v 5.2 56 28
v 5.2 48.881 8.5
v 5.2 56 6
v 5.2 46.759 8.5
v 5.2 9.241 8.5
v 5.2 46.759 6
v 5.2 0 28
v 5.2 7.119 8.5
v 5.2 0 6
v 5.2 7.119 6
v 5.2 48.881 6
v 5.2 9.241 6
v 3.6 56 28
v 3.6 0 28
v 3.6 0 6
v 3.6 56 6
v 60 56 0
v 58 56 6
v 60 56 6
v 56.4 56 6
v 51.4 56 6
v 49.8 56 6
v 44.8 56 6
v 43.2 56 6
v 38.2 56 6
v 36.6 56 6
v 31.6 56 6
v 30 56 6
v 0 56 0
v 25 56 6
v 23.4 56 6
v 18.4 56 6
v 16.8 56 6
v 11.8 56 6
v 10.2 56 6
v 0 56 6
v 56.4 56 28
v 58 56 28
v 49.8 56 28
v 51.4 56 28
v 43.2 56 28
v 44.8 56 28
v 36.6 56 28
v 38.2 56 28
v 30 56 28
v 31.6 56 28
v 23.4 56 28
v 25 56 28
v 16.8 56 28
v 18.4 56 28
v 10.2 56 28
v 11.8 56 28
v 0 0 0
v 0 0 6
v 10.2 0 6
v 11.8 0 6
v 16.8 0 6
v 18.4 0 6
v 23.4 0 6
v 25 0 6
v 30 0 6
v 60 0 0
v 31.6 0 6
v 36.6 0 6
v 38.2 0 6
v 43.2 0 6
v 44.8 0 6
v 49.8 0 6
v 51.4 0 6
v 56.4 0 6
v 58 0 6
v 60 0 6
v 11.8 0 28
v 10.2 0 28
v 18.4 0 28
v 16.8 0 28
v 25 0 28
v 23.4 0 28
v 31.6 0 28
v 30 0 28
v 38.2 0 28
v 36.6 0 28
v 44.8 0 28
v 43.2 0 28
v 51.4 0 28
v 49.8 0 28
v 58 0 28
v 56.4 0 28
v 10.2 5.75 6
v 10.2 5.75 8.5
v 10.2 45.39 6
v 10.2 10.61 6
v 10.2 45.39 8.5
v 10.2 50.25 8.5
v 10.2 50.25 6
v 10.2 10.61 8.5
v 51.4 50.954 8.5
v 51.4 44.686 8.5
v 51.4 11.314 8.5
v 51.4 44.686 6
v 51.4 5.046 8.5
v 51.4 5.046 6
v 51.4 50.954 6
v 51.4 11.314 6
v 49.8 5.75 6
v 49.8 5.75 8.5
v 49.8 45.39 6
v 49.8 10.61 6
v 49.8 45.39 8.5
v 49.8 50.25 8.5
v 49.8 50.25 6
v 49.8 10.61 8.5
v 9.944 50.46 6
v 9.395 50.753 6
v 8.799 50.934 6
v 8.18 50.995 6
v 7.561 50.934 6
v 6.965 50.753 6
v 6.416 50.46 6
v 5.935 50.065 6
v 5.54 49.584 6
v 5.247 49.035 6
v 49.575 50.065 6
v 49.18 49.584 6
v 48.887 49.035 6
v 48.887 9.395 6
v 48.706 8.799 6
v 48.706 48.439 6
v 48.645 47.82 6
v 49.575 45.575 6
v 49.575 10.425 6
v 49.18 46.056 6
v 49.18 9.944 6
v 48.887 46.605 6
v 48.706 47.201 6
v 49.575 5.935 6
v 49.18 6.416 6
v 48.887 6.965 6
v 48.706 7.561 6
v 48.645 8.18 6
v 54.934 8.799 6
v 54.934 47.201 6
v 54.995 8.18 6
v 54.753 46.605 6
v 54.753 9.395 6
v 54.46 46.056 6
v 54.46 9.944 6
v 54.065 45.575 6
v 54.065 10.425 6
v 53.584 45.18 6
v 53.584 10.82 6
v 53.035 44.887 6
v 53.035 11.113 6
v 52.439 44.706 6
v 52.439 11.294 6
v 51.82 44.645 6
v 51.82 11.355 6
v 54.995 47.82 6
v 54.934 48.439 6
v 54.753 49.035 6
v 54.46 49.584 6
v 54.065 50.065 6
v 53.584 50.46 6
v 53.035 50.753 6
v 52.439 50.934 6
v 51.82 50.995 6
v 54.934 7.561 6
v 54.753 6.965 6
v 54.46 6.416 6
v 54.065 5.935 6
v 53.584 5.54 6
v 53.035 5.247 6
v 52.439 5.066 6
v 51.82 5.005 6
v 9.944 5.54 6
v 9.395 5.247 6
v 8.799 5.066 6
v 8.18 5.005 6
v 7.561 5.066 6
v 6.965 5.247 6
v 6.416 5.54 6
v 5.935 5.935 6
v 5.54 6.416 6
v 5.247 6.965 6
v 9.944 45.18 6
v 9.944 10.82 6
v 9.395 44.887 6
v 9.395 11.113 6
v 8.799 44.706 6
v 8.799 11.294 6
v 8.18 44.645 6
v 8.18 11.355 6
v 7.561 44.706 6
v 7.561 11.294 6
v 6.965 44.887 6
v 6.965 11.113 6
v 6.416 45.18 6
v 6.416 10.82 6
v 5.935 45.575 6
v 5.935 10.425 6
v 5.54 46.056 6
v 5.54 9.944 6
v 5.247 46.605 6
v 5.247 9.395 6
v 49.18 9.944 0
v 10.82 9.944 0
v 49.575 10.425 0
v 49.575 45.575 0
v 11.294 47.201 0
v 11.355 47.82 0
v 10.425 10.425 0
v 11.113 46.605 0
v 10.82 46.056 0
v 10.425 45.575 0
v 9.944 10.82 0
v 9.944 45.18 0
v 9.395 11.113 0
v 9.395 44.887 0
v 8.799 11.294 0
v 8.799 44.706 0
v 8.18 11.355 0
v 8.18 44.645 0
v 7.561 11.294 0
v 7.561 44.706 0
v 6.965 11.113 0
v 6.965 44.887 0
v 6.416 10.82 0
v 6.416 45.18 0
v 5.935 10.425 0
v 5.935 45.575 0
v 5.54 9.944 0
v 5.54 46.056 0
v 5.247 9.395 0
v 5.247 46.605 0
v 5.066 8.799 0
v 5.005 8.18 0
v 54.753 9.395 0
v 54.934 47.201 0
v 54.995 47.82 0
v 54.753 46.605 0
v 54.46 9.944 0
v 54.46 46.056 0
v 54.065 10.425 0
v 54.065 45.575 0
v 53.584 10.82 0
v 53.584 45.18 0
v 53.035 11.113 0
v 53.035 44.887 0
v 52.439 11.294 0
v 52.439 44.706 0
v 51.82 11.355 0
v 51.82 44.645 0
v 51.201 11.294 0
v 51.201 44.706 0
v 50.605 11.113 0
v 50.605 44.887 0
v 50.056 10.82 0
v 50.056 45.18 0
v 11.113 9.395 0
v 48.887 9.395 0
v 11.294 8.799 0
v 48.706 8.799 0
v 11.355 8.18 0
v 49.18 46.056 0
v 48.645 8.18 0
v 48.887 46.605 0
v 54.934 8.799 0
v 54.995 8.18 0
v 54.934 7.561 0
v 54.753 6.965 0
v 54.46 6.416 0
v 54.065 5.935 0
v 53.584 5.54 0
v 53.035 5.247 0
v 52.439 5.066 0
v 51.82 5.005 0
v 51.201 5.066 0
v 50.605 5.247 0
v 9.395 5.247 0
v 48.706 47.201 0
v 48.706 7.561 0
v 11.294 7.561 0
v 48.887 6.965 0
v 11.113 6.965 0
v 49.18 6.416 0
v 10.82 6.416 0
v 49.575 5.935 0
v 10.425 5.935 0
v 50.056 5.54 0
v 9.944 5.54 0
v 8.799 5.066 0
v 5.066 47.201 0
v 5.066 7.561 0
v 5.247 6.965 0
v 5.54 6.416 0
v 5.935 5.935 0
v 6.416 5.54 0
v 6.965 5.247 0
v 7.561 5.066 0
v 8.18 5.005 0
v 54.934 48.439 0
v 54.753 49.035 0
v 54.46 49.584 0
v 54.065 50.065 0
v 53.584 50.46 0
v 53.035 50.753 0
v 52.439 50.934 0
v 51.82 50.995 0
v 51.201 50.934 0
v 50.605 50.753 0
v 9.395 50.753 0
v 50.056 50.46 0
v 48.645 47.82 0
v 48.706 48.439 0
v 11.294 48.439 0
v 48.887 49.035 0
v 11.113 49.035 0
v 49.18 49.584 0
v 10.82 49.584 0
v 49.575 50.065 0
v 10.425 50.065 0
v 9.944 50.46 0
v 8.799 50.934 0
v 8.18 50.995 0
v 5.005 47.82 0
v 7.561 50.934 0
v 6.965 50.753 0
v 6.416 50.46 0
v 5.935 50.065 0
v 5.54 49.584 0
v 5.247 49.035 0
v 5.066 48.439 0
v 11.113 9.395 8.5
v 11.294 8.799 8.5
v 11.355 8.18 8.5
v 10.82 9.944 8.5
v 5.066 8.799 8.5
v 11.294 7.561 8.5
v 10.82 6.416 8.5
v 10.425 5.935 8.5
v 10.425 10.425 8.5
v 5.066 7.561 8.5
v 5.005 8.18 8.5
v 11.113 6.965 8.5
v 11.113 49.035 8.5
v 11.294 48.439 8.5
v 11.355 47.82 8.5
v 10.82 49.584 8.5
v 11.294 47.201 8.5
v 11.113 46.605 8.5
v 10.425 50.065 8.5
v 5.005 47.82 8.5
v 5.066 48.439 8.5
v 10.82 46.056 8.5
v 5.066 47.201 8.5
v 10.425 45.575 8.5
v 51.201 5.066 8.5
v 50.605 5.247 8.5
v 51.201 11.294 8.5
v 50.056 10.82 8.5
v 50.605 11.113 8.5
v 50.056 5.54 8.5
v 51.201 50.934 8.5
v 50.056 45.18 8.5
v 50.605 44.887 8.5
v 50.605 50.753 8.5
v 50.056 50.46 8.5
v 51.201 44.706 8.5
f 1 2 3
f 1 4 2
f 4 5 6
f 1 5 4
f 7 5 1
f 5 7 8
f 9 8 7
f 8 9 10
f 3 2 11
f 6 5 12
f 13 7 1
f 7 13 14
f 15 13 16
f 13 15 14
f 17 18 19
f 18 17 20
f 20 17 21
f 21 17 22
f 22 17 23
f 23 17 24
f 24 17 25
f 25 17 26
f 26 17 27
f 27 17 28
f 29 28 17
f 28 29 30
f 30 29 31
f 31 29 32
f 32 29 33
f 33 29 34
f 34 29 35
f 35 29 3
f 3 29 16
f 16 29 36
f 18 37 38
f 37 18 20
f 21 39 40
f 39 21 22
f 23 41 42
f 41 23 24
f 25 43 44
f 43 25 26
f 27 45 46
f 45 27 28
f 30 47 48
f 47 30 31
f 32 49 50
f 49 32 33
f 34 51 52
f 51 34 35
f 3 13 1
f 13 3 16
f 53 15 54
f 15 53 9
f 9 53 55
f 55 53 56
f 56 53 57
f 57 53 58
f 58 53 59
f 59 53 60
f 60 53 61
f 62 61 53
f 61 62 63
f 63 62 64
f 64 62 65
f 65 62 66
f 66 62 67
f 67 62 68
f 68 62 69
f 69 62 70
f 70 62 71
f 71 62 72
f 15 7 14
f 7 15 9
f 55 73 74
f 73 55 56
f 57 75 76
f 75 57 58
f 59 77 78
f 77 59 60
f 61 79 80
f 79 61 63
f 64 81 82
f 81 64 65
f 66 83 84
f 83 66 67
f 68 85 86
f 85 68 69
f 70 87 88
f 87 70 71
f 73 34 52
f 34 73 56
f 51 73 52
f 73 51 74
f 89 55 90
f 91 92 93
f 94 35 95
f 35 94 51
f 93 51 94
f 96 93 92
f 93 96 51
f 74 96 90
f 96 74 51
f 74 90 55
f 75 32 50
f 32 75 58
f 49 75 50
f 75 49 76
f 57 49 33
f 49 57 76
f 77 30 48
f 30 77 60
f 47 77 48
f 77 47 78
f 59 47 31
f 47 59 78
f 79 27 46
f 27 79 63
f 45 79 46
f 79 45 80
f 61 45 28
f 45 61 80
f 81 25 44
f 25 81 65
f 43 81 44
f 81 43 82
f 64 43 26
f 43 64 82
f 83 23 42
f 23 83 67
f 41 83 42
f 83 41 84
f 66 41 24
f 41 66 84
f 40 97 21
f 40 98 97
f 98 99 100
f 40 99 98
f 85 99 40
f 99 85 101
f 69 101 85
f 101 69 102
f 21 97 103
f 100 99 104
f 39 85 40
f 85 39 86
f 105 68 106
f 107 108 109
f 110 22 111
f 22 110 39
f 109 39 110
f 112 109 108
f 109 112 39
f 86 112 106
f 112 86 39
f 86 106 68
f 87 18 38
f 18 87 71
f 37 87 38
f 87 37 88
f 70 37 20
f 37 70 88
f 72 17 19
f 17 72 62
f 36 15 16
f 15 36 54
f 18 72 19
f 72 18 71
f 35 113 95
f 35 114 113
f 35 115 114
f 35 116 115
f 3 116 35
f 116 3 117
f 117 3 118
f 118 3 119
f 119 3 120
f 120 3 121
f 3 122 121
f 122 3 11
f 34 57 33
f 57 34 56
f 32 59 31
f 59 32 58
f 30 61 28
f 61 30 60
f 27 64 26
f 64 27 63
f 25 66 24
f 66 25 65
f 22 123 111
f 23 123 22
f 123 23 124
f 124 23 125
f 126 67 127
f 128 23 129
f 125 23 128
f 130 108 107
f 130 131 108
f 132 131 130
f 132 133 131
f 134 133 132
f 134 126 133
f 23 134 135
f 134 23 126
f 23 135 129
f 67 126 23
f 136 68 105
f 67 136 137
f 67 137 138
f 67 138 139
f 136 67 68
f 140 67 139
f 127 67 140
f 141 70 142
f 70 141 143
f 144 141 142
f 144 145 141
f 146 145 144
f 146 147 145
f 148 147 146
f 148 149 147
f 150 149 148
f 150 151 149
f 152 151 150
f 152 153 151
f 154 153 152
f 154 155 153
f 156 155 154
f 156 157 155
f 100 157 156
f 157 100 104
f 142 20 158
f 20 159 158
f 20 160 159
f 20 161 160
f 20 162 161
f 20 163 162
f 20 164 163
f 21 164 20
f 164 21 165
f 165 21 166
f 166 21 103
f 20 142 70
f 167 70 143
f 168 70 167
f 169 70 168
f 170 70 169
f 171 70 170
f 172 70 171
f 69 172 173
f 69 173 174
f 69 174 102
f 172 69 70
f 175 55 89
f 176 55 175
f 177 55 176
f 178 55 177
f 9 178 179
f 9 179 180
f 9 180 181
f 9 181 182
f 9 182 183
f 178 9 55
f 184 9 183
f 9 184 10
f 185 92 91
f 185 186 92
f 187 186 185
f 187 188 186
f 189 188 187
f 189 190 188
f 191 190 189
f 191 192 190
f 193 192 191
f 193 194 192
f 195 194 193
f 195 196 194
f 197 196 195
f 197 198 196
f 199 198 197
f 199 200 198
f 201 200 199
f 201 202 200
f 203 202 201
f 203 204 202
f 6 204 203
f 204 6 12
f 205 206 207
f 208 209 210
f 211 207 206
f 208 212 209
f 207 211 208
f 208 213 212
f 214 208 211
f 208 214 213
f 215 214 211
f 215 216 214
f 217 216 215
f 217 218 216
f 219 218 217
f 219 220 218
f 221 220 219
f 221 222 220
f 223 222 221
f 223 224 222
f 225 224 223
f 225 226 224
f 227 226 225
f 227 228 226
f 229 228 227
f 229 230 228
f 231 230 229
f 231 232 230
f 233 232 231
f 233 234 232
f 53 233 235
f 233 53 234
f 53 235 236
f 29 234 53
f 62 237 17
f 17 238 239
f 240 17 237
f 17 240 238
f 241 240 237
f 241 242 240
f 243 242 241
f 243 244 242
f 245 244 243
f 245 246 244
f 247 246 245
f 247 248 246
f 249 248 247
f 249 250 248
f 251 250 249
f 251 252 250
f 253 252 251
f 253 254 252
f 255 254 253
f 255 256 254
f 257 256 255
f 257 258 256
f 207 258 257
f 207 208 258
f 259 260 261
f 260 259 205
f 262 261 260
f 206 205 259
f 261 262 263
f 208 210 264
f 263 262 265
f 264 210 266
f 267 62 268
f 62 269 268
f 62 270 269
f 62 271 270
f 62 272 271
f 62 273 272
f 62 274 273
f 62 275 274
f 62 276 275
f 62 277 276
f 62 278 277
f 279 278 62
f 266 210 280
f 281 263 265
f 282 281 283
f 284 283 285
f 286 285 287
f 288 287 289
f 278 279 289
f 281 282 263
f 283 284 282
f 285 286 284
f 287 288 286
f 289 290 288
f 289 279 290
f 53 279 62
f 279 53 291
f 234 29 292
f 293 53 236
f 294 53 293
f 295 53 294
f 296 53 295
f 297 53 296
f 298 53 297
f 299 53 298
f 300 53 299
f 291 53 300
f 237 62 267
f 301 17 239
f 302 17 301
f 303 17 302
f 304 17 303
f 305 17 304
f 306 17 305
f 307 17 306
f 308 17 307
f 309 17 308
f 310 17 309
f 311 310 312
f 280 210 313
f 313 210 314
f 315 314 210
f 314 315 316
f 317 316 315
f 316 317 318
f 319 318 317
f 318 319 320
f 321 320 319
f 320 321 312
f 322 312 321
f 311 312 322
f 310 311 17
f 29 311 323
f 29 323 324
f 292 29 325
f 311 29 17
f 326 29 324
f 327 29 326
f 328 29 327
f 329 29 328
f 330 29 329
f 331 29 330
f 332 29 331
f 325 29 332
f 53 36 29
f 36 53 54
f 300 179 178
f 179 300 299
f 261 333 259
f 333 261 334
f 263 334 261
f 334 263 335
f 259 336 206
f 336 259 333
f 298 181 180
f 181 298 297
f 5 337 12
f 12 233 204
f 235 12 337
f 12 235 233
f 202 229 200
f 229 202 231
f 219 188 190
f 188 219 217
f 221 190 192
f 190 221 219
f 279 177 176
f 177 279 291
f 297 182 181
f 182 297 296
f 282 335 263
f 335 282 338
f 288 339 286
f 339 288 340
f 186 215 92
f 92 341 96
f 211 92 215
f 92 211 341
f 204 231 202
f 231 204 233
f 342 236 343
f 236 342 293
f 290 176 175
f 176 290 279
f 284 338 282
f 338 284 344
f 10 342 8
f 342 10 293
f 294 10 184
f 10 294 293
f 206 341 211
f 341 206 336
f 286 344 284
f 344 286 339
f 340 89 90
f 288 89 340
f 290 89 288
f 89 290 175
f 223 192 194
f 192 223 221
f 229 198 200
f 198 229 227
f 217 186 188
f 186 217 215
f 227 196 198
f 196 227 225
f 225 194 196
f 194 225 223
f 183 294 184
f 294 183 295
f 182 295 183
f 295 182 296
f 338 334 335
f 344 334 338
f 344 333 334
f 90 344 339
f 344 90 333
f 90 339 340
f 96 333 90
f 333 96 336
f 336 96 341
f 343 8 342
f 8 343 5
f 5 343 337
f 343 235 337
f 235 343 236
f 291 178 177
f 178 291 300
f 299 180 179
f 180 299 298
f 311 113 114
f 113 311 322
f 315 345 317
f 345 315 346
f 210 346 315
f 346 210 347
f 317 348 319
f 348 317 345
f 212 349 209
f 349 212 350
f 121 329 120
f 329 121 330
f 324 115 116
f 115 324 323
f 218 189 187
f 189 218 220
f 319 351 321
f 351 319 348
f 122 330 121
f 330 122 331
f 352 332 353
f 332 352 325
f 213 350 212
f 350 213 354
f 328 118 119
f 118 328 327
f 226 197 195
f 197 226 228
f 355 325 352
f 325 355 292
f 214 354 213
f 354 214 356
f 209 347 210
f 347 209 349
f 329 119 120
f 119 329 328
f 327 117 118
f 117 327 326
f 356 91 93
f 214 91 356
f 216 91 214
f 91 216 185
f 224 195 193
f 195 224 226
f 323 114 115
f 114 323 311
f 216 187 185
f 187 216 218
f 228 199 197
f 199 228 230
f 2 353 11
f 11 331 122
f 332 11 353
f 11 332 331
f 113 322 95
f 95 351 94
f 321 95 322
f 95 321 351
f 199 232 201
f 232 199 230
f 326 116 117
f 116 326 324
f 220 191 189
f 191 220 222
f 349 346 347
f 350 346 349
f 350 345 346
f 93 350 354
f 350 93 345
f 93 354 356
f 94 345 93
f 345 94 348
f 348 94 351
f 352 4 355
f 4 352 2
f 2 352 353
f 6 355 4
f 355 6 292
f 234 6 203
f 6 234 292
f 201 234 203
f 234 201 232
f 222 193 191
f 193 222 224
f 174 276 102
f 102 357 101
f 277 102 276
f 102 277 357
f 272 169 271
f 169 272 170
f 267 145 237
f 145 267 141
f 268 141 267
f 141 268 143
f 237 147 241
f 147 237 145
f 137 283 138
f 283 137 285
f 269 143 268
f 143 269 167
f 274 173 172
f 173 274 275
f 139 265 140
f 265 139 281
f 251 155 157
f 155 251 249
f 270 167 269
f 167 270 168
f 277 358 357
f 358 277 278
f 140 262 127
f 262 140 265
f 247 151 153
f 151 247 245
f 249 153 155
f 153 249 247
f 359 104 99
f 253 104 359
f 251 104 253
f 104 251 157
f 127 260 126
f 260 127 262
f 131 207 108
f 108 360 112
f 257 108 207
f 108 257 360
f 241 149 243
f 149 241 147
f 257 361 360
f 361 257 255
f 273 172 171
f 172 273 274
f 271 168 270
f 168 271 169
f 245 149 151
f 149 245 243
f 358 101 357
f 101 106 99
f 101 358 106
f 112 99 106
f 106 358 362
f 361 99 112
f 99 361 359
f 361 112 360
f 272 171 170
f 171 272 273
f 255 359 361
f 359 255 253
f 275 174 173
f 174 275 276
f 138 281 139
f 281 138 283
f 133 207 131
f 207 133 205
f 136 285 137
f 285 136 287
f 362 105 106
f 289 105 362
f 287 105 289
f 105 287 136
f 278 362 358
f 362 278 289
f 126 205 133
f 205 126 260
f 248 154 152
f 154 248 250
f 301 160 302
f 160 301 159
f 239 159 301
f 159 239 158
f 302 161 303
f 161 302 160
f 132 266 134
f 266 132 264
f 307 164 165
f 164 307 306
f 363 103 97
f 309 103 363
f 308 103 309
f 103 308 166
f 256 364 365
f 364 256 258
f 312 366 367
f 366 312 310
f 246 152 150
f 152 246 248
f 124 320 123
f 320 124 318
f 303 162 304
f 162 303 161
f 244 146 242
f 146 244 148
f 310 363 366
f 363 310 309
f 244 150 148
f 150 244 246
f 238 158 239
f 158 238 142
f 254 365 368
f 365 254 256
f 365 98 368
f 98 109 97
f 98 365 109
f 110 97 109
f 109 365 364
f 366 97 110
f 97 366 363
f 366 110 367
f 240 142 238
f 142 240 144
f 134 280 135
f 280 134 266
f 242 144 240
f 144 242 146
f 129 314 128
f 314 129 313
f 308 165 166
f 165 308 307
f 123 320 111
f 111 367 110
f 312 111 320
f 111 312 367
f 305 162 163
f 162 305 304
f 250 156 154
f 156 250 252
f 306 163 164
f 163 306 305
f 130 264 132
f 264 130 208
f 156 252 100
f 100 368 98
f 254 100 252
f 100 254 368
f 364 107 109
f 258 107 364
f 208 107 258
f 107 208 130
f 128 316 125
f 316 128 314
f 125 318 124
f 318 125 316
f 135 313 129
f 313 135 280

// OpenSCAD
$fn = 32;

// ----------------------------------------------------------------------
// Finned heat sink: 60 x 56 mm base, 22 mm fins
// ----------------------------------------------------------------------

// --- parameters (mm) ---
base_w = 60;              // base width
base_d = 56;              // base depth
base_t = 6;               // base thickness
fin_h = 22;               // fin height above the base
holes_d = 6.35;           // fixing holes
hole_x = 21.82;           // hole offset in x
hole_y = 19.82;           // hole offset in y
fin_t = 1.6;              // fin thickness
fin_pitch = 6.6;          // fin pitch
fin_count = 9;            // number of fins
fin_x0 = 3.6;             // first fin offset

difference() {
  union() {
    cube([base_w, base_d, base_t]);
    for (i = [0 : fin_count - 1]) {
      translate([fin_x0 + i * fin_pitch, 0, base_t - 0.5]) cube([fin_t, base_d, fin_h + 0.5]);
    }
  }
  /* fixing holes through the base, 2.5 mm clear on both sides */
  for (hx = [-21.82, 21.82]) {
    for (hy = [-19.82, 19.82]) {
      translate([base_w / 2 + hx, base_d / 2 + hy, -2.5]) cylinder(h = base_t + 5, d = holes_d);
    }
  }
}
